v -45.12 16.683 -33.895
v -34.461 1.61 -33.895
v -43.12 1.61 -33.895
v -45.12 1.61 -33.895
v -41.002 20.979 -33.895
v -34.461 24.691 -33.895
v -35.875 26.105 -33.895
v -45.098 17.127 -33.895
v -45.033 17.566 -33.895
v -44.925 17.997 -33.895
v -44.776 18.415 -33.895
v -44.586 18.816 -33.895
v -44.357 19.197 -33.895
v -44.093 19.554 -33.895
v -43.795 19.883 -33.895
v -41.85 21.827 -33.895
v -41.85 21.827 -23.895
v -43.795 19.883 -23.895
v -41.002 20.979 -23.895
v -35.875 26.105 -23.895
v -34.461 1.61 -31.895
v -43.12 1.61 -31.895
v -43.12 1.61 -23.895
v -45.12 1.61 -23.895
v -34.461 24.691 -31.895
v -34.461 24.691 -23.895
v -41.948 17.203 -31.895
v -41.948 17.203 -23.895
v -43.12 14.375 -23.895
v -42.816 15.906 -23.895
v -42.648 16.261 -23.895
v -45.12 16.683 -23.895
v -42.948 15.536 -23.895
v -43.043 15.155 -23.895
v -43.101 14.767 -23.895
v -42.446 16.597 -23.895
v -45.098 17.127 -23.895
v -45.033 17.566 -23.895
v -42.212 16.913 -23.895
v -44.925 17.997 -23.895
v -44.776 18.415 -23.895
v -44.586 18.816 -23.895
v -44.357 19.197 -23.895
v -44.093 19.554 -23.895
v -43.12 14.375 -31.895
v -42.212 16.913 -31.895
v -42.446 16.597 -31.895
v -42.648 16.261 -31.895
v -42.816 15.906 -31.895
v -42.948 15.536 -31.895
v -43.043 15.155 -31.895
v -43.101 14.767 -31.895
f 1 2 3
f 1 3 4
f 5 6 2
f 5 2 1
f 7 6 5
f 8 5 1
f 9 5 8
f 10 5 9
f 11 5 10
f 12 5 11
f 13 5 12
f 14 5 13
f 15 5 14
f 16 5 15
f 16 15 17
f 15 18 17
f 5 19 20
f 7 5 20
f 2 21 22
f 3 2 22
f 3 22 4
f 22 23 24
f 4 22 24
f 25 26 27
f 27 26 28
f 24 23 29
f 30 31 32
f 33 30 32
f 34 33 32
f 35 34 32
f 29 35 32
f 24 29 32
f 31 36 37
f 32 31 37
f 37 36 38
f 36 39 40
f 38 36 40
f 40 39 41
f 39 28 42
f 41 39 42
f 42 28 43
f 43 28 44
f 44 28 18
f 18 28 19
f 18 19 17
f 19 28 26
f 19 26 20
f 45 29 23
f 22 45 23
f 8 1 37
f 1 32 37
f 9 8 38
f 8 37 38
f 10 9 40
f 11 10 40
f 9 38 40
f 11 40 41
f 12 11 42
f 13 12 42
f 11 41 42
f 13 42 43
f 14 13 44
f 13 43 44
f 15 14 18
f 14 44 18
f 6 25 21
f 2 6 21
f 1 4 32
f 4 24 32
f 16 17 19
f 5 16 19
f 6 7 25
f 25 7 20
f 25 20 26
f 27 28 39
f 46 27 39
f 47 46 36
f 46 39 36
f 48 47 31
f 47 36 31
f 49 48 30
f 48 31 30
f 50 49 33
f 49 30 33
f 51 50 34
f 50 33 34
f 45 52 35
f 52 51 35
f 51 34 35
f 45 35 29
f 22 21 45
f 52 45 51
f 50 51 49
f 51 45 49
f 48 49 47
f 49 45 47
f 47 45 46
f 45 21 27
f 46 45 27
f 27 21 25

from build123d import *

# Parameters (mm, degrees)
BOSS_EXTRUDE1_DEPTH = 5
BOSS_EXTRUDE2_START = -2
BOSS_EXTRUDE2_DEPTH = 2


with BuildPart() as part:
    # Sketch2 → Boss-Extrude1 (new, symmetric)
    with BuildSketch(Plane(origin=(-44.395698949, 24.726348819, -28.895), x_dir=(0.707106781186551, -0.7071067811865441, 0), z_dir=(0, 0, 1))):
        with BuildLine():
            Line((5.05, 7), (7.05, 7))
            Line((7.05, 7), (7.05, -3.589034995))
            ThreePointArc((7.05, -3.589034995), (7.35448187, -5.119768725), (8.221572875, -6.41746212))
            Line((8.221572875, -6.41746212), (17.247782384, -15.443671629))
            Line((17.247782384, -15.443671629), (15.833568821, -16.857885191))
            Line((15.833568821, -16.857885191), (5.175341815, -6.199658185))
            ThreePointArc((5.175341815, -6.199658185), (4.194445115, -4.731642531), (3.85, -3))
            Line((3.85, -3), (3.85, -0.25))
            Line((3.85, -0.25), (5.05, -0.25))
            Line((5.05, -0.25), (5.05, 7))
        make_face()
    extrude(amount=BOSS_EXTRUDE1_DEPTH, both=True)

    # Sketch3 → Boss-Extrude2 (add)
    with BuildSketch(Plane(origin=(0, 0, -33.895), x_dir=(-1, 0, 0), z_dir=(0, 0, -1)).offset(BOSS_EXTRUDE2_START)):
        with BuildLine():
            Line((34.460848673, 24.69099348), (34.460848673, 1.61))
            Line((34.460848673, 1.61), (43.12, 1.61))
            Line((43.12, 1.61), (43.12, 14.374987904))
            ThreePointArc((43.12, 14.374987904), (42.81551813, 15.905721633), (41.948427125, 17.203415028))
            Line((41.948427125, 17.203415028), (34.460848673, 24.69099348))
        make_face()
    extrude(amount=BOSS_EXTRUDE2_DEPTH)


solid = part.part
